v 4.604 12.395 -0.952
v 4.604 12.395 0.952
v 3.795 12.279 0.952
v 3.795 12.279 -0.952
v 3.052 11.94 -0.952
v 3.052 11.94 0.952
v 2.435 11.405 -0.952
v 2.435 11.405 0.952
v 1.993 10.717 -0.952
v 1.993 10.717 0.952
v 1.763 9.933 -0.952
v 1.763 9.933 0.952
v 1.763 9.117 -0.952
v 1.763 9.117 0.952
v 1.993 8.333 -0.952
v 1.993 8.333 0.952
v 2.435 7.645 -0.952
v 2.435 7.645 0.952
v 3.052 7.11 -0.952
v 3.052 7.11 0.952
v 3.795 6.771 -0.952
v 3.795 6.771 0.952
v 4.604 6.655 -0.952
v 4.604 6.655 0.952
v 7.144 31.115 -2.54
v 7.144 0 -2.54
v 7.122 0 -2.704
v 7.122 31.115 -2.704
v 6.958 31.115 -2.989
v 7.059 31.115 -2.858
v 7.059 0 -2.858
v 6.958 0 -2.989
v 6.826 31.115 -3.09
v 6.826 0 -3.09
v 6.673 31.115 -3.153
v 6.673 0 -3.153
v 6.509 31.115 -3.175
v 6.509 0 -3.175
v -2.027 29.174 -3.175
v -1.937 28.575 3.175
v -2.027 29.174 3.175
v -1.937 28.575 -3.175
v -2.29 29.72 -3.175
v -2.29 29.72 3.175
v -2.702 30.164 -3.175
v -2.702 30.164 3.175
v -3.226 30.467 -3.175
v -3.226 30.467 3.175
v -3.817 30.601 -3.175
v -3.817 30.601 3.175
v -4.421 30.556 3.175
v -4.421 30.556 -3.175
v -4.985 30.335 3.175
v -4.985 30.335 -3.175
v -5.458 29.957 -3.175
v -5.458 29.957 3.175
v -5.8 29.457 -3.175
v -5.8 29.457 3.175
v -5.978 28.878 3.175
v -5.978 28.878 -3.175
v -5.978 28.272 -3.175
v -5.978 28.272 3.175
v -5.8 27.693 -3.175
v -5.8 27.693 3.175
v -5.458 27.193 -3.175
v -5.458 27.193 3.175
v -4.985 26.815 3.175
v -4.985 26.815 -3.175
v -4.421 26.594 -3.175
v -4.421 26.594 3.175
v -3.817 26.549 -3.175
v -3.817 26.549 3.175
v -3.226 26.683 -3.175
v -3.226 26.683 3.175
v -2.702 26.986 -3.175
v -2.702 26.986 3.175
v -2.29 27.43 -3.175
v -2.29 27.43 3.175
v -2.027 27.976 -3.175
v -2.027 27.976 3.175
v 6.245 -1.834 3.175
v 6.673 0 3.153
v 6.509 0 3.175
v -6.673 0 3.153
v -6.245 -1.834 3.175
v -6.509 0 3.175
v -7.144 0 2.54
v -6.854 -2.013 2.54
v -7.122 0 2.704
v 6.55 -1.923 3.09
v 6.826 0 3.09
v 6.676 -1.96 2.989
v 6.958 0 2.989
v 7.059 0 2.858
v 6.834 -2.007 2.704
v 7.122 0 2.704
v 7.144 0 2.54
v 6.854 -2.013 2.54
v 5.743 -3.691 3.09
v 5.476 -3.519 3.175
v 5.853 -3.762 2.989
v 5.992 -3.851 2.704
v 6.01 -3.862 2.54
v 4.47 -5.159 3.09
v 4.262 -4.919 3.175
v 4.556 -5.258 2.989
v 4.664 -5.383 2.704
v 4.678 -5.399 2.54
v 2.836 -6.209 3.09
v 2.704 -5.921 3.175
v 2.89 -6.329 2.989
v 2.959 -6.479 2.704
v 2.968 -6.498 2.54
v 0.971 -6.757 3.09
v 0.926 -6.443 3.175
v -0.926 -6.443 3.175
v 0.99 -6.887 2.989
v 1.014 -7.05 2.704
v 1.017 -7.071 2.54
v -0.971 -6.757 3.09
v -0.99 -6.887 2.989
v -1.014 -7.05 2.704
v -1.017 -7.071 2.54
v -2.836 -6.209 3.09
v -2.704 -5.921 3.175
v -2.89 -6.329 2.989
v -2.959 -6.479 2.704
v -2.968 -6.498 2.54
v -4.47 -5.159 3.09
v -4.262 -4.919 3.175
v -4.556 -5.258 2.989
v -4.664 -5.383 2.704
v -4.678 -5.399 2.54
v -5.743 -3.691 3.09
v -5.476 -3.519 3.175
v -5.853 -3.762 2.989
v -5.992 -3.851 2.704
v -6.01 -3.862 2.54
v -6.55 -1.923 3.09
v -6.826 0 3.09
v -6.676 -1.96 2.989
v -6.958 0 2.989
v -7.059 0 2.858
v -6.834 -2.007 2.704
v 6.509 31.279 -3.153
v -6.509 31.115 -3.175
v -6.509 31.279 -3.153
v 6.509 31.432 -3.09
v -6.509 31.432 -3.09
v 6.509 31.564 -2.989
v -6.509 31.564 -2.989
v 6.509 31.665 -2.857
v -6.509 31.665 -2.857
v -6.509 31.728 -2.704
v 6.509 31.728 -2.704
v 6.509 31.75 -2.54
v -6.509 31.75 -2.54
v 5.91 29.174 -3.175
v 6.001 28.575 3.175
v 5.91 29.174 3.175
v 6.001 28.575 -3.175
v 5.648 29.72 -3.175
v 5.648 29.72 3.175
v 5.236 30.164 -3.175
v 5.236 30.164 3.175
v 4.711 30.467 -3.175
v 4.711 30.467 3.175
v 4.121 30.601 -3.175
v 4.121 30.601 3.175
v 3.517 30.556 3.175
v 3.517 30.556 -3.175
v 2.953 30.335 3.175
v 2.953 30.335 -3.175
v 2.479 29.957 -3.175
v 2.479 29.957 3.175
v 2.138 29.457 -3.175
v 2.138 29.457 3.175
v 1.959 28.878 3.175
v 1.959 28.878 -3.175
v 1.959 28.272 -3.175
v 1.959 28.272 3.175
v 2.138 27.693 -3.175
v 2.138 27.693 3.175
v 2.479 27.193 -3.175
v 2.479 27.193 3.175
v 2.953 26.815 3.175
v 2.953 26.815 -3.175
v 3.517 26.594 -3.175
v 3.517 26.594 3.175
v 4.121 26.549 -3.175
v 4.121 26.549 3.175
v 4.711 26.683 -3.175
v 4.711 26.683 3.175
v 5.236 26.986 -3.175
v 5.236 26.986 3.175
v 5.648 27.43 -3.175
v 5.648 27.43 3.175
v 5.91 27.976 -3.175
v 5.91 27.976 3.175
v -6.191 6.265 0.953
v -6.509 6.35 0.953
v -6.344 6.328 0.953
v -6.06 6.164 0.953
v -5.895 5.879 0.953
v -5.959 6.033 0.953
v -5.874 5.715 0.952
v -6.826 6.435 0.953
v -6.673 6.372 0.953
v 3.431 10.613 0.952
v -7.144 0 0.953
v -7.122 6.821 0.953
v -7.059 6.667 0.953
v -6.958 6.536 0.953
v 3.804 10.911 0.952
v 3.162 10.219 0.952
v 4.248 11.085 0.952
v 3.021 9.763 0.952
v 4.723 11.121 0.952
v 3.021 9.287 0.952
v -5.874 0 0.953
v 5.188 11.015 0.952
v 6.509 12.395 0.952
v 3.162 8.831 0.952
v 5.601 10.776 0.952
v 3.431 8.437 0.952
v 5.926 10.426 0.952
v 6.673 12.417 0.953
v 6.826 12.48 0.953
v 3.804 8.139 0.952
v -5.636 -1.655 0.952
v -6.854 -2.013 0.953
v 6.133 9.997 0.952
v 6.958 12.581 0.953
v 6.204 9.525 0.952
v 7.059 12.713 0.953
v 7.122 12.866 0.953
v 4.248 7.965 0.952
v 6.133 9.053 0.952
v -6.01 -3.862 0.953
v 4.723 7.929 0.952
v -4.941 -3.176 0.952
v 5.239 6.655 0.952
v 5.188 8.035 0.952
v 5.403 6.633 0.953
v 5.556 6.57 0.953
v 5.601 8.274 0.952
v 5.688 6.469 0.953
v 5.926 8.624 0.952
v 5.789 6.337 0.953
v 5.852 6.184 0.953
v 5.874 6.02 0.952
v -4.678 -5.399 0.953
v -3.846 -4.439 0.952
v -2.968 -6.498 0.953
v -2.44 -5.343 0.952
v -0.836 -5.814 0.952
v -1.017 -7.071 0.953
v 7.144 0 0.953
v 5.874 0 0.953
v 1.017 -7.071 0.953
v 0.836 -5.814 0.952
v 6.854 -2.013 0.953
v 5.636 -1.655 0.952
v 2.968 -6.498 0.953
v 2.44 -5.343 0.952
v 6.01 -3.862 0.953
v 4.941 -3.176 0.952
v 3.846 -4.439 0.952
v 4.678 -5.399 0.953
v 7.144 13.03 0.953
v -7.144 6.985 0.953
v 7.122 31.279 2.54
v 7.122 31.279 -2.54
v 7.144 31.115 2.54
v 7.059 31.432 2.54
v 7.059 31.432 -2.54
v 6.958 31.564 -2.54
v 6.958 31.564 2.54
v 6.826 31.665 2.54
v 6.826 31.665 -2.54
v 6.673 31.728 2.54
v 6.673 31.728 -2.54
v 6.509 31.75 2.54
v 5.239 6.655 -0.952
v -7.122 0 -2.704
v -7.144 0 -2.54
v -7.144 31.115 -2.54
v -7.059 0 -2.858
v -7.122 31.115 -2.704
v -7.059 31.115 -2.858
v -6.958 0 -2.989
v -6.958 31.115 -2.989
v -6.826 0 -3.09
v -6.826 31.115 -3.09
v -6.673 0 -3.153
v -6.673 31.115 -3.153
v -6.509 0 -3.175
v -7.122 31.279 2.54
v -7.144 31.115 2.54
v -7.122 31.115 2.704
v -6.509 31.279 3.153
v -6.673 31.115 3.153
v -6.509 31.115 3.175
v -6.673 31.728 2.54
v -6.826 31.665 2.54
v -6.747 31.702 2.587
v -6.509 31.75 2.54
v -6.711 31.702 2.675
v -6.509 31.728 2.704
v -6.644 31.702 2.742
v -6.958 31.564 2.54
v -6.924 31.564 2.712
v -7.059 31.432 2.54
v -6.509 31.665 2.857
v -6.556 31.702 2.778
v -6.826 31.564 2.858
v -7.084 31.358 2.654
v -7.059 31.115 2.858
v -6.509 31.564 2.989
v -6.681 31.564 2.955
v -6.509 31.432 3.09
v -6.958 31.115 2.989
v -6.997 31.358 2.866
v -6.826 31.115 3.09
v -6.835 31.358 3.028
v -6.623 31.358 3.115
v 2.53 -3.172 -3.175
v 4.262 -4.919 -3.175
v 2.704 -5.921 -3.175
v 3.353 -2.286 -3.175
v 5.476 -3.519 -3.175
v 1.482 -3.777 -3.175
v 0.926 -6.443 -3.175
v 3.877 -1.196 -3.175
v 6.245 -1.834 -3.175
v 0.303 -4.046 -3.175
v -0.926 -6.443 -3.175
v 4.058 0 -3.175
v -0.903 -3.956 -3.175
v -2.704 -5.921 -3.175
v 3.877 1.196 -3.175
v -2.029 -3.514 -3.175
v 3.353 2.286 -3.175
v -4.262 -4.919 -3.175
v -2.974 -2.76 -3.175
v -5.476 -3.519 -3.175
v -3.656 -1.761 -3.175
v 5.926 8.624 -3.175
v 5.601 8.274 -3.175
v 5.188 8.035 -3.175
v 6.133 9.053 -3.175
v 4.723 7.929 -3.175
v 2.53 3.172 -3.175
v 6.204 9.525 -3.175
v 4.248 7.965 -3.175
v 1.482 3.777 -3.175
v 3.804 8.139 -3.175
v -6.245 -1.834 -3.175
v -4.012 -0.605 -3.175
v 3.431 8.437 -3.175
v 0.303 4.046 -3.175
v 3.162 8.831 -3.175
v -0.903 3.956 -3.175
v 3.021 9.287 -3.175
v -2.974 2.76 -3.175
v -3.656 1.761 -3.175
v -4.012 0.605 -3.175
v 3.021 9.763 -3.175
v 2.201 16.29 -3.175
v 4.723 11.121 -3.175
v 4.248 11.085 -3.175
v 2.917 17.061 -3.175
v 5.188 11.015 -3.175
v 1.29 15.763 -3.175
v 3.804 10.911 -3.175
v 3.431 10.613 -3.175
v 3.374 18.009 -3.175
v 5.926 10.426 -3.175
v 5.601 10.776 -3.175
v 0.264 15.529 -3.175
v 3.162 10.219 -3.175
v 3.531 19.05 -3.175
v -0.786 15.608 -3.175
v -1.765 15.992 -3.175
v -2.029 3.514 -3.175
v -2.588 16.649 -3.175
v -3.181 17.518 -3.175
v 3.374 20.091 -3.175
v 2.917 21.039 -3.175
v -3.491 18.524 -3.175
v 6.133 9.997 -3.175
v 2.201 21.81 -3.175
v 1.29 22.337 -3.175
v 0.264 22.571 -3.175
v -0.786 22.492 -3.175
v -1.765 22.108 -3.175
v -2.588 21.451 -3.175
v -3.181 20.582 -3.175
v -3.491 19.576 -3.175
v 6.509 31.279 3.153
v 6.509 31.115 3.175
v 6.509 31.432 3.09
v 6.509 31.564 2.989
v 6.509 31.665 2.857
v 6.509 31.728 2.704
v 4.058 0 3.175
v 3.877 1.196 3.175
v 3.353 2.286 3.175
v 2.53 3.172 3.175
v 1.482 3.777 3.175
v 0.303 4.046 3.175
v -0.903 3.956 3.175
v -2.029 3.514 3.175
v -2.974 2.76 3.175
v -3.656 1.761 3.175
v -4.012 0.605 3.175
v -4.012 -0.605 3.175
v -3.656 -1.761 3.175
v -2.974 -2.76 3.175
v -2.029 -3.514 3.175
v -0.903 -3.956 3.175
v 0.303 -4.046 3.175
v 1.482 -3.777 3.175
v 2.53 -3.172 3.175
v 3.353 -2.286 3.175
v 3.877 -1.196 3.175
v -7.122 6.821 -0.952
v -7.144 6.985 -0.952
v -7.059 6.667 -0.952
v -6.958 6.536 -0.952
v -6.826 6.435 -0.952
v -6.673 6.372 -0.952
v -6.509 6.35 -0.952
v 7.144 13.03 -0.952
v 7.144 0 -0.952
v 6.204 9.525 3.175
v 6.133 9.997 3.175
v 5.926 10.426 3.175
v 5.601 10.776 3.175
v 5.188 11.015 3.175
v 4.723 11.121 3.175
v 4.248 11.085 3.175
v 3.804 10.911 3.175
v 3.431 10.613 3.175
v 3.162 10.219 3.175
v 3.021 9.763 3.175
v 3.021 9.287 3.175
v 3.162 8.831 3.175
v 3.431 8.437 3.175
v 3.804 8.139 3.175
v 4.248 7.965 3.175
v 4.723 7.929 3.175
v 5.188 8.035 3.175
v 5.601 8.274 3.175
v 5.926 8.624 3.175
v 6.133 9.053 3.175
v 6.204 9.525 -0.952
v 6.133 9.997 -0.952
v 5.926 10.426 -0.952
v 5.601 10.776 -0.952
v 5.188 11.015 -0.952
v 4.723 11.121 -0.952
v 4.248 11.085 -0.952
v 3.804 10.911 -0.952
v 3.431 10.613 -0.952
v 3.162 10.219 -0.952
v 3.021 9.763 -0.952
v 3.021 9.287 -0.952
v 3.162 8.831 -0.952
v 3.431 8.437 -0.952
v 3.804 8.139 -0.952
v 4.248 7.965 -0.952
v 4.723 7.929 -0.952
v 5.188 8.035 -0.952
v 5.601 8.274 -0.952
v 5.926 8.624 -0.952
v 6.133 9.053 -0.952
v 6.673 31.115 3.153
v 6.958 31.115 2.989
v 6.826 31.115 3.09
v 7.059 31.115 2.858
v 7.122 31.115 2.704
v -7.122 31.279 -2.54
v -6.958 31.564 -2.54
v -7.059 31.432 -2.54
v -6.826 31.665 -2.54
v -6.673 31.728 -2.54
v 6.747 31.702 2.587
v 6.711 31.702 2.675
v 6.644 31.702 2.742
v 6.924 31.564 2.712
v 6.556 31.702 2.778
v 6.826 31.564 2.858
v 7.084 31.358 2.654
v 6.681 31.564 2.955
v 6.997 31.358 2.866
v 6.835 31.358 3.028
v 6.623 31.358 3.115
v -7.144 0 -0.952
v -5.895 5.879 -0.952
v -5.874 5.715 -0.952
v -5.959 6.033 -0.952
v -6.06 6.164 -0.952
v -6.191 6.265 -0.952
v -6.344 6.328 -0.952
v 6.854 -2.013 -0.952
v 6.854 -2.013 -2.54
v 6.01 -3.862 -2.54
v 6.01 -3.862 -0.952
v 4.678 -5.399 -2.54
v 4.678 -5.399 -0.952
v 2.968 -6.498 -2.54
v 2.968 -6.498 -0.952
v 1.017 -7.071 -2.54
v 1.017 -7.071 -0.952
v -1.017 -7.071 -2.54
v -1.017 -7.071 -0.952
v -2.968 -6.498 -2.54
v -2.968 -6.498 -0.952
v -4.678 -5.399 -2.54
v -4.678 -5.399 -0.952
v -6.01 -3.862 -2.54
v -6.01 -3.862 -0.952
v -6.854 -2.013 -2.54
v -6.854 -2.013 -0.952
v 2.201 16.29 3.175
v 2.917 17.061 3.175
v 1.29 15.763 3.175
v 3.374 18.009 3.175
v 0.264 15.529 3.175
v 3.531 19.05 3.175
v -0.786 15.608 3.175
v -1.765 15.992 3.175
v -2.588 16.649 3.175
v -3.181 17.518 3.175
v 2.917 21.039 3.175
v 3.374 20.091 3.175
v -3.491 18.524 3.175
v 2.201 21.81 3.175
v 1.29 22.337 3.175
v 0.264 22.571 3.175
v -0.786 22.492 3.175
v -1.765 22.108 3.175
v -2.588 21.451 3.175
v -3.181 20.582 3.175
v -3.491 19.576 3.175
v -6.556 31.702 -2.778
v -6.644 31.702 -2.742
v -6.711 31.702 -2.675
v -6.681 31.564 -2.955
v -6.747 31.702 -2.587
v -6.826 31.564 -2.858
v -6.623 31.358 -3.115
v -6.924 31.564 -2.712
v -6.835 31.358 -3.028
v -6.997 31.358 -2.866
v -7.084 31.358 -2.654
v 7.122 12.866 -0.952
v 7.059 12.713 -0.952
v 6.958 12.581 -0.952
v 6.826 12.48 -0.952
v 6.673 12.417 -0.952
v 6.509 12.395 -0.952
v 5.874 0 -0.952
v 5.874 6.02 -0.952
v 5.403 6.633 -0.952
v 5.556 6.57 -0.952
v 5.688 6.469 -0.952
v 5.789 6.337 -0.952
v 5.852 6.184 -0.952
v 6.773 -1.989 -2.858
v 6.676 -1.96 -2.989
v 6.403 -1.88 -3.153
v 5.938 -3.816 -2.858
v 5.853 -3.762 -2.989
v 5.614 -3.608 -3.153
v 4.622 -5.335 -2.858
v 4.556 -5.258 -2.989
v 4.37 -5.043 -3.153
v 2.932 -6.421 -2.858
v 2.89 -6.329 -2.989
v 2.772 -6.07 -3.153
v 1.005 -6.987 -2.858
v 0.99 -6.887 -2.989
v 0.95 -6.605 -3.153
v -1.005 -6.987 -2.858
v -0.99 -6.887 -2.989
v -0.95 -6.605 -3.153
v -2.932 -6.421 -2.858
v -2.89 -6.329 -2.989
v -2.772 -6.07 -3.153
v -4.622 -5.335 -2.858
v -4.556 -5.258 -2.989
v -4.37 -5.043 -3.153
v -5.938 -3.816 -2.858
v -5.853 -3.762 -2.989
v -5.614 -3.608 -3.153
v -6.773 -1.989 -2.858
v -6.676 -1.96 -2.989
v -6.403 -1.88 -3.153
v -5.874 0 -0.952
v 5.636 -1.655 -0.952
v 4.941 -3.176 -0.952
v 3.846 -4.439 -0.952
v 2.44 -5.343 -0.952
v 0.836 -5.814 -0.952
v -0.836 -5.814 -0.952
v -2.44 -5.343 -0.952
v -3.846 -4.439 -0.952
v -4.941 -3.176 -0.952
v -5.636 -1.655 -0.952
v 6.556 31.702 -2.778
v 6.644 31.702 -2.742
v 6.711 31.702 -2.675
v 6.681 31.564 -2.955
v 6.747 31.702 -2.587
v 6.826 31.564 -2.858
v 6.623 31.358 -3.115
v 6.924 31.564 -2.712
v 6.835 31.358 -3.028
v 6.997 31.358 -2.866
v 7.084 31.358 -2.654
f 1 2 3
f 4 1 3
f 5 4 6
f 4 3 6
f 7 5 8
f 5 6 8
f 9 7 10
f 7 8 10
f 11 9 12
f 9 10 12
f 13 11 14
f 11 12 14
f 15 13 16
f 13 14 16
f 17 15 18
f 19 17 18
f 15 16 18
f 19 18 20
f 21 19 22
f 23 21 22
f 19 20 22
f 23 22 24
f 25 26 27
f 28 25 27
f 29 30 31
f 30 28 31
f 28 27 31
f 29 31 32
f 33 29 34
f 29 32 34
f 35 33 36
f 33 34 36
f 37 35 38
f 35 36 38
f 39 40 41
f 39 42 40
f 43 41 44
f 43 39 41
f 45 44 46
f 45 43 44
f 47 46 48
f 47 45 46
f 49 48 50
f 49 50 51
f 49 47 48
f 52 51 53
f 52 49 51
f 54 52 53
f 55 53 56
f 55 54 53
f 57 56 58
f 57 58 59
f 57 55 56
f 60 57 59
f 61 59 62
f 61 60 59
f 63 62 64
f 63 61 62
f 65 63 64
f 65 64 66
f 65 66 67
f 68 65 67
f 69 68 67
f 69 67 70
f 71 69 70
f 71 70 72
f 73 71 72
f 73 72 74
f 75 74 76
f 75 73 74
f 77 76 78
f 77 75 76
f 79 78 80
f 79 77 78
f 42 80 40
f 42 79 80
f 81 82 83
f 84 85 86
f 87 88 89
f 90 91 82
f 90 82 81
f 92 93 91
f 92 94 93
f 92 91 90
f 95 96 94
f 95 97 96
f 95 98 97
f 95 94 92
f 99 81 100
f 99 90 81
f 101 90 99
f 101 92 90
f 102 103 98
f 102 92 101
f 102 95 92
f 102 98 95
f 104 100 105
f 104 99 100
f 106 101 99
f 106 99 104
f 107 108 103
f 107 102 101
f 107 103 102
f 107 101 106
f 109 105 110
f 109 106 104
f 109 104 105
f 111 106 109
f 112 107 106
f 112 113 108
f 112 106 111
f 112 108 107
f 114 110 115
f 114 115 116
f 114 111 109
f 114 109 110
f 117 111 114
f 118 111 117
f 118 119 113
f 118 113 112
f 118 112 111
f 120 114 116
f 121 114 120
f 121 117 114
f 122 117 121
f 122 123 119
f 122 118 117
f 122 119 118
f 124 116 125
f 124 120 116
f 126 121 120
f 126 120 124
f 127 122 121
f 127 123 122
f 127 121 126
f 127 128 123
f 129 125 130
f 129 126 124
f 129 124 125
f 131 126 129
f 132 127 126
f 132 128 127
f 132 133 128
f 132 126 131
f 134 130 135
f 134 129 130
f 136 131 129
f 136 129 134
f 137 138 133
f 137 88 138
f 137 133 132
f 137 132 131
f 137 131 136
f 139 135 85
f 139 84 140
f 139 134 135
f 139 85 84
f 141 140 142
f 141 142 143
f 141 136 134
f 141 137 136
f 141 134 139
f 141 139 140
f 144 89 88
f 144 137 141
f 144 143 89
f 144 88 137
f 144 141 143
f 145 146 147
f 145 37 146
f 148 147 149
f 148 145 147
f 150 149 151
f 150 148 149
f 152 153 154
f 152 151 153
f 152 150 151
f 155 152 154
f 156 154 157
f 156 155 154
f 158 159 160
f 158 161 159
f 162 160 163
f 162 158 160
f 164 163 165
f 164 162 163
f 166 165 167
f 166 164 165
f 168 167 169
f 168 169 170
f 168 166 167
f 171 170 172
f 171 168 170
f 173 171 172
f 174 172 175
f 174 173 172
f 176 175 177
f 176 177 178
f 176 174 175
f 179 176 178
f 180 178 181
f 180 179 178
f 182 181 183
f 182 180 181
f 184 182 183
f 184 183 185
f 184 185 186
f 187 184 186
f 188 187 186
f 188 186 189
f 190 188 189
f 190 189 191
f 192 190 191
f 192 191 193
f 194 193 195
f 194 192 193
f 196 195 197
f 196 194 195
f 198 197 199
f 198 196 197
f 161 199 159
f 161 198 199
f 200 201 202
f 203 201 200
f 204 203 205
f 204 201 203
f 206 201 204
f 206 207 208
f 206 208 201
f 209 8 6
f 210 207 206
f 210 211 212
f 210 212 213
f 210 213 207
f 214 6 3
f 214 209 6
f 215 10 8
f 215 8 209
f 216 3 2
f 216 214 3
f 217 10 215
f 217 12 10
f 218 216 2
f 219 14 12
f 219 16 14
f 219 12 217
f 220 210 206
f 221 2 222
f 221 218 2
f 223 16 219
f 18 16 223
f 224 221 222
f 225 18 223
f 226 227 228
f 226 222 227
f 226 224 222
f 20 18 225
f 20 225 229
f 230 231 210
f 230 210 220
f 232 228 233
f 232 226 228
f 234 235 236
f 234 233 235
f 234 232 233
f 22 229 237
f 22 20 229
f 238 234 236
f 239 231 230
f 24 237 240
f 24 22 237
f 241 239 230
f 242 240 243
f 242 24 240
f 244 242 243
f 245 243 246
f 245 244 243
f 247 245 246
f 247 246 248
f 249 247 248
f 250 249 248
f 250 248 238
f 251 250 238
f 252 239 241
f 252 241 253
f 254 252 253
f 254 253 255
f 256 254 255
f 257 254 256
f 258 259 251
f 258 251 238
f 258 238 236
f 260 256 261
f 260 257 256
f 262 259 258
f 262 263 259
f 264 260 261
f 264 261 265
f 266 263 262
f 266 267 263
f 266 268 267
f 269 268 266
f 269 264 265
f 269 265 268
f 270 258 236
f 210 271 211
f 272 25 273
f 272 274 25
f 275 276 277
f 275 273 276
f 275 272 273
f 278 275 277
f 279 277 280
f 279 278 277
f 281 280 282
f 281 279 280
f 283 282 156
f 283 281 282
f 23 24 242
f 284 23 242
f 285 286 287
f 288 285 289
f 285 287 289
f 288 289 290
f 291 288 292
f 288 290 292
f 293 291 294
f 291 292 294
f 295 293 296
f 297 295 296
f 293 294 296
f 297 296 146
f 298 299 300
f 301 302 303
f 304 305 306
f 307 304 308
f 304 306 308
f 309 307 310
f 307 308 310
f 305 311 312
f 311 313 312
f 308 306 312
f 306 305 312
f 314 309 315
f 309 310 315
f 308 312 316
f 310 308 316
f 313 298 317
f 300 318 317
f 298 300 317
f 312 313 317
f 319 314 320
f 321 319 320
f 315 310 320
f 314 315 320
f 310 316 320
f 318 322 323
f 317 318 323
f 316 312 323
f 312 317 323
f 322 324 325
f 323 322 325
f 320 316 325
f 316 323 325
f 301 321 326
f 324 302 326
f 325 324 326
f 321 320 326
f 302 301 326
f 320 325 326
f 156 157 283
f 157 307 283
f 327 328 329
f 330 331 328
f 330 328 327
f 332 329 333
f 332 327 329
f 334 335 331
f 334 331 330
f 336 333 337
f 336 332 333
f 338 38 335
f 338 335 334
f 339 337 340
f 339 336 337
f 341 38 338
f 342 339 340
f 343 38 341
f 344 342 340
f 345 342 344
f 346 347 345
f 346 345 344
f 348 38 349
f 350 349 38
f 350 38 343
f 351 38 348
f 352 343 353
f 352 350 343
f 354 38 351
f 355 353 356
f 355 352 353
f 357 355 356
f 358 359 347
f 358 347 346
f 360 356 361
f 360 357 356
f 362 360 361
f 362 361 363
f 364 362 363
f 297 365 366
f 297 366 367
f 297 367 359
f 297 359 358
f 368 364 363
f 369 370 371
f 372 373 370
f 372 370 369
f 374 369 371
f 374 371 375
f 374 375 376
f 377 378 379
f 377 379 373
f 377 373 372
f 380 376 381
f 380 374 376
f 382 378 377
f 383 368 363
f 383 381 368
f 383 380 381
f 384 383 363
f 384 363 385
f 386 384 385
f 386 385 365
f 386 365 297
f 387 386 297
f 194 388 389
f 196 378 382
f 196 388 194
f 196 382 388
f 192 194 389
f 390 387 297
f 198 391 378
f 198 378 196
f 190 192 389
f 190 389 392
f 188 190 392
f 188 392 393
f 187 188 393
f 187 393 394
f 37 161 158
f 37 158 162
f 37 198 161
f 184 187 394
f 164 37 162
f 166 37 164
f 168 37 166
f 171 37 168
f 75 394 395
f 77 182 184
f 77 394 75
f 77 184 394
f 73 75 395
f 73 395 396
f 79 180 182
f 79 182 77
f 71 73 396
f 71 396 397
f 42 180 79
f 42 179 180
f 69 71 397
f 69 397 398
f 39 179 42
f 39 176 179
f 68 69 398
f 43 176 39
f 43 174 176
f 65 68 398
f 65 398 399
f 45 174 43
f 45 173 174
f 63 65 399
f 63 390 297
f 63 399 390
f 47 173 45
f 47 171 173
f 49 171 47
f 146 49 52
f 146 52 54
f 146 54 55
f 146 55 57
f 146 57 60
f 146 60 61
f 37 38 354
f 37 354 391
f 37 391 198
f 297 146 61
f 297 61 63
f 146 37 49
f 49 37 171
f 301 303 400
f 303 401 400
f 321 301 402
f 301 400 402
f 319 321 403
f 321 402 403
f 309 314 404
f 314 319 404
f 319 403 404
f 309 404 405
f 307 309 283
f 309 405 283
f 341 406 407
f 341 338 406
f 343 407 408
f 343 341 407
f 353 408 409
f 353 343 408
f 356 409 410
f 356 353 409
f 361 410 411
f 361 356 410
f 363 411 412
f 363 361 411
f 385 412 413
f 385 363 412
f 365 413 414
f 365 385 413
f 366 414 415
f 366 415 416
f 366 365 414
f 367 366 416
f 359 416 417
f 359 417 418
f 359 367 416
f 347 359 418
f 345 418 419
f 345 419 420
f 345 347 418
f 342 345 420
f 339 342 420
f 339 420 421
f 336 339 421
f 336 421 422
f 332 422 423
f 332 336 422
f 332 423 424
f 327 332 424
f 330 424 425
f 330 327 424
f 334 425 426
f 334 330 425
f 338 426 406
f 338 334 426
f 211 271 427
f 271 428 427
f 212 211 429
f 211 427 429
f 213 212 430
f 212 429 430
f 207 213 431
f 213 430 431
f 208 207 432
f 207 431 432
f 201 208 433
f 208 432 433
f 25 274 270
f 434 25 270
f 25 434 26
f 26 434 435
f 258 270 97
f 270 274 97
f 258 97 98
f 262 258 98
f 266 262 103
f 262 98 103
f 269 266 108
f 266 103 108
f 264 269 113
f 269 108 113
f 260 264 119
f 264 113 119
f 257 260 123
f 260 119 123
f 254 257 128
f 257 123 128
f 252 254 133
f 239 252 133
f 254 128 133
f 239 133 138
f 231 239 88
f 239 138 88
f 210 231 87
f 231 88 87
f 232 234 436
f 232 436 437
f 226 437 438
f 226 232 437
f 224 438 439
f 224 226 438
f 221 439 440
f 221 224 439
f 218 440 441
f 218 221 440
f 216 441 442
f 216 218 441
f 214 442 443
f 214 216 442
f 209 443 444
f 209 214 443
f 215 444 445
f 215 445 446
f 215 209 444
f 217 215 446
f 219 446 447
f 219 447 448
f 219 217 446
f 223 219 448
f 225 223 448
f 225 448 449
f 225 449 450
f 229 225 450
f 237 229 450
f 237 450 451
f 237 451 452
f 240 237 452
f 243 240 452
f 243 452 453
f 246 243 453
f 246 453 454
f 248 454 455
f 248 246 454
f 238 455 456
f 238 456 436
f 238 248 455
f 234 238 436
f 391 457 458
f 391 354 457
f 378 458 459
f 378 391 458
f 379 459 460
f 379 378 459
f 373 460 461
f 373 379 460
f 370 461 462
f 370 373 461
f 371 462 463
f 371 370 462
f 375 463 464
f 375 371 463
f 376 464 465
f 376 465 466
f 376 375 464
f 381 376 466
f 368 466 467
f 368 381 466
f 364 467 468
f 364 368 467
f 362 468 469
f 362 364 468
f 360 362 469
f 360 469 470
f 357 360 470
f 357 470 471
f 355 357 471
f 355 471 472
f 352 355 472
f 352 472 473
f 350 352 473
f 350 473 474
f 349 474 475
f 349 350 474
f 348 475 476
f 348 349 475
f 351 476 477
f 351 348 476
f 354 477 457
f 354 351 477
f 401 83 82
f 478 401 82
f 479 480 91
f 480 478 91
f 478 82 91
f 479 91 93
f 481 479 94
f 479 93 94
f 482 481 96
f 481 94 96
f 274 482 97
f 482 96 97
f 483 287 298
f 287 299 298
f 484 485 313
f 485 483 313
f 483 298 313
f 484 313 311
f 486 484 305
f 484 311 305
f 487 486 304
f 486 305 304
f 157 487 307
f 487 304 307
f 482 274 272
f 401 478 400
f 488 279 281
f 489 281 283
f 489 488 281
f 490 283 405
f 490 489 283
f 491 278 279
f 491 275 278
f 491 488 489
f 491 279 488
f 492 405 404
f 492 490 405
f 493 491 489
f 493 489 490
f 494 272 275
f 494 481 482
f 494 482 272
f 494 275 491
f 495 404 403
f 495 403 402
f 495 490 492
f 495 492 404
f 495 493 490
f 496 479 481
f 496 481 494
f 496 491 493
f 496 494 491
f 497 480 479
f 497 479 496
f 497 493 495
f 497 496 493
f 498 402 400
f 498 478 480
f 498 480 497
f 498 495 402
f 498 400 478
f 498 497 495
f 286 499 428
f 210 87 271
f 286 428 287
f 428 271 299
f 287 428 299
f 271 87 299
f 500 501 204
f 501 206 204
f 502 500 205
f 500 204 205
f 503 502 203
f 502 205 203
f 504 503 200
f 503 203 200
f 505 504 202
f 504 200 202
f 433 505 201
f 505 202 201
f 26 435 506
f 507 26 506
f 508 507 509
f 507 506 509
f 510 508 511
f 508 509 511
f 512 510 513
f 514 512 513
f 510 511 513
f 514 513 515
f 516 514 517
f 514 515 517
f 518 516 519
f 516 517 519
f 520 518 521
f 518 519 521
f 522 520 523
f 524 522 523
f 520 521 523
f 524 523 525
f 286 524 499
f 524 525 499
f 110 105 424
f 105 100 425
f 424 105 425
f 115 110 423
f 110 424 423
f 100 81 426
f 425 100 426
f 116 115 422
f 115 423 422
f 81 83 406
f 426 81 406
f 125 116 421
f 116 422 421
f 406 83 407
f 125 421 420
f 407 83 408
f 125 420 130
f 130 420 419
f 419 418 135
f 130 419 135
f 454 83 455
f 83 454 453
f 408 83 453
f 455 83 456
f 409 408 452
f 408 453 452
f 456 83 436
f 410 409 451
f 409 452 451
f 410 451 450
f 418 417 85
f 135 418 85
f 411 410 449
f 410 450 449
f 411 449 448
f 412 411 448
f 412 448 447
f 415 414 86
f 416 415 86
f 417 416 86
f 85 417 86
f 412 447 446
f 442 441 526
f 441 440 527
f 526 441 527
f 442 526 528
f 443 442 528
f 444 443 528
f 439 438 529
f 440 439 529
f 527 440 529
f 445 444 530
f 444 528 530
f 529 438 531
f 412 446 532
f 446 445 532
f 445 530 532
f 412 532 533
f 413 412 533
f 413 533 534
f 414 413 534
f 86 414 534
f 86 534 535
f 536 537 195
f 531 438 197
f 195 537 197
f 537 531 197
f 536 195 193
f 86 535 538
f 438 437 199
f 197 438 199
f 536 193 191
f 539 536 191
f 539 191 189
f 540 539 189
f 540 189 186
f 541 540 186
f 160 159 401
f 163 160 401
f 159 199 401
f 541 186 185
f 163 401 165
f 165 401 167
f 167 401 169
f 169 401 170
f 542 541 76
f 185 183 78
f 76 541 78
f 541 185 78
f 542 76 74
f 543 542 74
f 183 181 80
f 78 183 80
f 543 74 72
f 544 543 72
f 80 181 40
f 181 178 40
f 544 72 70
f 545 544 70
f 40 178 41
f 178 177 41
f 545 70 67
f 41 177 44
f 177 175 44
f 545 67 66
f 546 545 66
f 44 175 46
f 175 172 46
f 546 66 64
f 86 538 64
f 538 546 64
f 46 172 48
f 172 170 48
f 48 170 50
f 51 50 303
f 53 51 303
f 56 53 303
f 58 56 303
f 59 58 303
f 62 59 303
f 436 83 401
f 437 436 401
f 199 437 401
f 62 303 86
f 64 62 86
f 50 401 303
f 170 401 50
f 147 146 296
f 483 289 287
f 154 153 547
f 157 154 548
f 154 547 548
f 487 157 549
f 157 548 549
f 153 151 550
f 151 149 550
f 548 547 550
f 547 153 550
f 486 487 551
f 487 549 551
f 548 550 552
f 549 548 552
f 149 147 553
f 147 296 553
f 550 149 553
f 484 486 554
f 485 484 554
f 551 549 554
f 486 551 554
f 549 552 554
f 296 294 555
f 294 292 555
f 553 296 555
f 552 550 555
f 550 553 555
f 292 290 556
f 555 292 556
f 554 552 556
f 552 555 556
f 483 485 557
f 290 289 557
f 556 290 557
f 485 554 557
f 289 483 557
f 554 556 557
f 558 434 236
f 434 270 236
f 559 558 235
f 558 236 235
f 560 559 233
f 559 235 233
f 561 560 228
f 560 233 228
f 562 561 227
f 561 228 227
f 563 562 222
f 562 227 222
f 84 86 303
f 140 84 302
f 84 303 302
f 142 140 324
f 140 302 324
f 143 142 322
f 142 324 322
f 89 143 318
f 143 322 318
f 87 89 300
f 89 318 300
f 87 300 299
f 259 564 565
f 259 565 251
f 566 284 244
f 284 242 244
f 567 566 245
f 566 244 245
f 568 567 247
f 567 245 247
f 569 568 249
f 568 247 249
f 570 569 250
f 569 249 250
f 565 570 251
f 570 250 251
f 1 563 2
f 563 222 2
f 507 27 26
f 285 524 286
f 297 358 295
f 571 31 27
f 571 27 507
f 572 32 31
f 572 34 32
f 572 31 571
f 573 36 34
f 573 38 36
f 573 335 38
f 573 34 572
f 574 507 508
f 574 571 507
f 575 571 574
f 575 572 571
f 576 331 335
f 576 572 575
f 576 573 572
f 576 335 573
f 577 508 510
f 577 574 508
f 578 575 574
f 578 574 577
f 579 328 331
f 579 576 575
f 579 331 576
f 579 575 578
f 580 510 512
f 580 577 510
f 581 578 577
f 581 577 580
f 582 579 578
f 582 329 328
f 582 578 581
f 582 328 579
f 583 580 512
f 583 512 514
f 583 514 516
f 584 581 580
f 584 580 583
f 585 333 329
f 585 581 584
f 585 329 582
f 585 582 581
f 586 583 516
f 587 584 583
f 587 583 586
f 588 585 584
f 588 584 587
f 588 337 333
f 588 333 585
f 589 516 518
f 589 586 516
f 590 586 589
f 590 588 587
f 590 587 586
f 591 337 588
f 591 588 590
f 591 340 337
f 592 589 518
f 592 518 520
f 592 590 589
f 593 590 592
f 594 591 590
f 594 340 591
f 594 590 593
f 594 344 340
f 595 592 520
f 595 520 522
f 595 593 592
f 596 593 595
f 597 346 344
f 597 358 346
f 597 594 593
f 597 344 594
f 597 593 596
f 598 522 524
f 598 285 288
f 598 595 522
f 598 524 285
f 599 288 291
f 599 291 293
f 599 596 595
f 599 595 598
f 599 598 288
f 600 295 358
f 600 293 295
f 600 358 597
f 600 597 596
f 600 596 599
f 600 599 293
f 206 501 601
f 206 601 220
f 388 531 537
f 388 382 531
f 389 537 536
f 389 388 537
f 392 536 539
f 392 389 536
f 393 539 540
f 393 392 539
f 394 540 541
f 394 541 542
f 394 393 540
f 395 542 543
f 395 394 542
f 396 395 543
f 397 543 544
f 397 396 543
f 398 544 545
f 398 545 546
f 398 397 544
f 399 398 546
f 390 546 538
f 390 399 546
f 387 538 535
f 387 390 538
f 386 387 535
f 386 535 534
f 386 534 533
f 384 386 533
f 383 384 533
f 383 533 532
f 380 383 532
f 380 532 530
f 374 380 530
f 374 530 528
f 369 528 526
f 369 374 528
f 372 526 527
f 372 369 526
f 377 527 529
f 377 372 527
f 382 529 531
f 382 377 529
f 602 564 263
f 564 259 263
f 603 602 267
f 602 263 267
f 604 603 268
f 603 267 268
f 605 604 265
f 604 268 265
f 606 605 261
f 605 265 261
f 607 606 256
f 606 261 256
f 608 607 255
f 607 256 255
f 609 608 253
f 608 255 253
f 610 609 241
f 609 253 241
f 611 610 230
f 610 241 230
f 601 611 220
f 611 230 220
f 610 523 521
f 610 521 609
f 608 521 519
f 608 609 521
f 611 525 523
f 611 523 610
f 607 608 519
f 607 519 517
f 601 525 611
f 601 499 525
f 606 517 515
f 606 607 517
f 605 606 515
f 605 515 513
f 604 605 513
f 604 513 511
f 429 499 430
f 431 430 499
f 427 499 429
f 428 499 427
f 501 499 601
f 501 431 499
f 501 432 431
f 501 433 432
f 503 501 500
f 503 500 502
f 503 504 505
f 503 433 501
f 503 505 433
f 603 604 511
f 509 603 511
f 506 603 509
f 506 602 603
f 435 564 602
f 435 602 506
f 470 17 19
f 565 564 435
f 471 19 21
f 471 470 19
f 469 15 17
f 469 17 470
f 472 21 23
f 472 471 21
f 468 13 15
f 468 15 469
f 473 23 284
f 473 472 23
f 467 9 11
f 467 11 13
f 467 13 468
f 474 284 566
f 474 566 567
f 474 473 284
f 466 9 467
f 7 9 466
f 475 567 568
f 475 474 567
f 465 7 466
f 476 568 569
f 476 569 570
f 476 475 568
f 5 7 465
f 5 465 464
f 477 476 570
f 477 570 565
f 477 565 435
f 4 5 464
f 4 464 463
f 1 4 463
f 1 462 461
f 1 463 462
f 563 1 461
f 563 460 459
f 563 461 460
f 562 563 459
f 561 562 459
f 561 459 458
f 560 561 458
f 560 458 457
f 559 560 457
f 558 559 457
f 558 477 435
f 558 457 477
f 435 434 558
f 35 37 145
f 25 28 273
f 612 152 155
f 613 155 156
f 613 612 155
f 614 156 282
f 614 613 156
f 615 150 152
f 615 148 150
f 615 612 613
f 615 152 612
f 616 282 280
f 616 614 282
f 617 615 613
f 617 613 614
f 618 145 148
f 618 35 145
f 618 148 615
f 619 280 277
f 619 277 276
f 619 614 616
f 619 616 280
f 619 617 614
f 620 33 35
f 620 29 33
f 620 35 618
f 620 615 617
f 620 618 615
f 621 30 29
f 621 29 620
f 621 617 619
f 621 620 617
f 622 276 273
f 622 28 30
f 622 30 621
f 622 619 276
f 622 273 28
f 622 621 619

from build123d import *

# Parameters (mm, degrees)
SKETCH1_R           = 4.05765
SKETCH1_R_2         = 3.5306
SKETCH1_R_3         = 2.032
SKETCH1_R_4         = 1.6002
BOSS_EXTRUDE1_DEPTH = 3.175
SKETCH1_7_R         = 1.6002
CUT_EXTRUDE4_DEPTH  = 0.9525
SKETCH3_W           = 1.27
SKETCH3_H           = 1.905
FILLET1_R           = 0.635
FILLET2_R           = 0.635


with BuildPart() as part:
    # Sketch1 → Boss-Extrude1 (new, symmetric)
    with BuildSketch(Plane.XY):
        with BuildLine():
            Line((7.14375, 31.75), (7.14375, 0))
            ThreePointArc((7.14375, 0), (0, -7.14375), (-7.14375, 0))
            Line((-7.14375, 0), (-7.14375, 31.75))
            Line((-7.14375, 31.75), (7.14375, 31.75))
        make_face()
        Circle(SKETCH1_R, mode=Mode.SUBTRACT)
        with Locations((0, 19.05)):
            Circle(SKETCH1_R_2, mode=Mode.SUBTRACT)
        with Locations((-3.96875, 28.575)):
            Circle(SKETCH1_R_3, mode=Mode.SUBTRACT)
        with Locations((3.96875, 28.575)):
            Circle(SKETCH1_R_3, mode=Mode.SUBTRACT)
        with Locations((4.60375, 9.525)):
            Circle(SKETCH1_R_4, mode=Mode.SUBTRACT)
    extrude(amount=BOSS_EXTRUDE1_DEPTH, both=True)

    # Sketch1<7> → Cut-Extrude4 (cut, symmetric)
    with BuildSketch(Plane.XY):
        with BuildLine():
            Line((7.14375, 6.6548), (7.14375, 12.3952))
            Line((7.14375, 12.3952), (4.60375, 12.3952))
            ThreePointArc((4.60375, 12.3952), (1.73355, 9.525), (4.60375, 6.6548))
            Line((4.60375, 6.6548), (7.14375, 6.6548))
        make_face()
        with Locations((4.60375, 9.525)):
            Circle(SKETCH1_7_R, mode=Mode.SUBTRACT)
    extrude(amount=CUT_EXTRUDE4_DEPTH, both=True, mode=Mode.SUBTRACT)

    # Cut-Sweep1: sweep along a path in Sketch2
    with BuildLine(Plane.XY.offset(3.175)) as cut_sweep1_path:
        Line((7.14375, 6.6548), (7.14375, 0))
        ThreePointArc((7.14375, 0), (0, -7.14375), (-7.14375, 0))
        Line((-7.14375, 0), (-7.14375, 6.35))
    # Sketch3 → Cut-Sweep1 (sweep, cut)
    with BuildSketch(Plane(origin=(0, 6.6548, 0), x_dir=(1, 0, 0), z_dir=(0, 1, 0))):
        with Locations((6.50875, 0)):
            Rectangle(SKETCH3_W, SKETCH3_H)
    sweep(path=cut_sweep1_path.line, mode=Mode.SUBTRACT)

    # Fillet1
    fillet1_edges = [part.edges().sort_by_distance(p)[0] for p in [
        (0, -7.14375, 3.175),
        (-7.14375, 15.875, -3.175),
        (0, 31.75, -3.175),
        (7.14375, 15.875, 3.175),
        (7.14375, 15.875, -3.175),
        (0, -7.14375, -3.175),
        (-7.14375, 31.75, 0),
        (7.14375, 31.75, 0),
        (0, 31.75, 3.175),
        (-7.14375, 15.875, 3.175),
    ]]
    fillet(fillet1_edges, radius=FILLET1_R)

    # Fillet2
    fillet2_edges = [part.edges().sort_by_distance(p)[0] for p in [
        (5.87375, 6.6548, 0),
        (7.14375, 12.3952, 0),
        (-7.14375, 6.35, 0),
        (-5.87375, 6.35, 0),
    ]]
    fillet(fillet2_edges, radius=FILLET2_R - 0.0001)  # a hair under: the kernel refuses the full size


solid = part.part
